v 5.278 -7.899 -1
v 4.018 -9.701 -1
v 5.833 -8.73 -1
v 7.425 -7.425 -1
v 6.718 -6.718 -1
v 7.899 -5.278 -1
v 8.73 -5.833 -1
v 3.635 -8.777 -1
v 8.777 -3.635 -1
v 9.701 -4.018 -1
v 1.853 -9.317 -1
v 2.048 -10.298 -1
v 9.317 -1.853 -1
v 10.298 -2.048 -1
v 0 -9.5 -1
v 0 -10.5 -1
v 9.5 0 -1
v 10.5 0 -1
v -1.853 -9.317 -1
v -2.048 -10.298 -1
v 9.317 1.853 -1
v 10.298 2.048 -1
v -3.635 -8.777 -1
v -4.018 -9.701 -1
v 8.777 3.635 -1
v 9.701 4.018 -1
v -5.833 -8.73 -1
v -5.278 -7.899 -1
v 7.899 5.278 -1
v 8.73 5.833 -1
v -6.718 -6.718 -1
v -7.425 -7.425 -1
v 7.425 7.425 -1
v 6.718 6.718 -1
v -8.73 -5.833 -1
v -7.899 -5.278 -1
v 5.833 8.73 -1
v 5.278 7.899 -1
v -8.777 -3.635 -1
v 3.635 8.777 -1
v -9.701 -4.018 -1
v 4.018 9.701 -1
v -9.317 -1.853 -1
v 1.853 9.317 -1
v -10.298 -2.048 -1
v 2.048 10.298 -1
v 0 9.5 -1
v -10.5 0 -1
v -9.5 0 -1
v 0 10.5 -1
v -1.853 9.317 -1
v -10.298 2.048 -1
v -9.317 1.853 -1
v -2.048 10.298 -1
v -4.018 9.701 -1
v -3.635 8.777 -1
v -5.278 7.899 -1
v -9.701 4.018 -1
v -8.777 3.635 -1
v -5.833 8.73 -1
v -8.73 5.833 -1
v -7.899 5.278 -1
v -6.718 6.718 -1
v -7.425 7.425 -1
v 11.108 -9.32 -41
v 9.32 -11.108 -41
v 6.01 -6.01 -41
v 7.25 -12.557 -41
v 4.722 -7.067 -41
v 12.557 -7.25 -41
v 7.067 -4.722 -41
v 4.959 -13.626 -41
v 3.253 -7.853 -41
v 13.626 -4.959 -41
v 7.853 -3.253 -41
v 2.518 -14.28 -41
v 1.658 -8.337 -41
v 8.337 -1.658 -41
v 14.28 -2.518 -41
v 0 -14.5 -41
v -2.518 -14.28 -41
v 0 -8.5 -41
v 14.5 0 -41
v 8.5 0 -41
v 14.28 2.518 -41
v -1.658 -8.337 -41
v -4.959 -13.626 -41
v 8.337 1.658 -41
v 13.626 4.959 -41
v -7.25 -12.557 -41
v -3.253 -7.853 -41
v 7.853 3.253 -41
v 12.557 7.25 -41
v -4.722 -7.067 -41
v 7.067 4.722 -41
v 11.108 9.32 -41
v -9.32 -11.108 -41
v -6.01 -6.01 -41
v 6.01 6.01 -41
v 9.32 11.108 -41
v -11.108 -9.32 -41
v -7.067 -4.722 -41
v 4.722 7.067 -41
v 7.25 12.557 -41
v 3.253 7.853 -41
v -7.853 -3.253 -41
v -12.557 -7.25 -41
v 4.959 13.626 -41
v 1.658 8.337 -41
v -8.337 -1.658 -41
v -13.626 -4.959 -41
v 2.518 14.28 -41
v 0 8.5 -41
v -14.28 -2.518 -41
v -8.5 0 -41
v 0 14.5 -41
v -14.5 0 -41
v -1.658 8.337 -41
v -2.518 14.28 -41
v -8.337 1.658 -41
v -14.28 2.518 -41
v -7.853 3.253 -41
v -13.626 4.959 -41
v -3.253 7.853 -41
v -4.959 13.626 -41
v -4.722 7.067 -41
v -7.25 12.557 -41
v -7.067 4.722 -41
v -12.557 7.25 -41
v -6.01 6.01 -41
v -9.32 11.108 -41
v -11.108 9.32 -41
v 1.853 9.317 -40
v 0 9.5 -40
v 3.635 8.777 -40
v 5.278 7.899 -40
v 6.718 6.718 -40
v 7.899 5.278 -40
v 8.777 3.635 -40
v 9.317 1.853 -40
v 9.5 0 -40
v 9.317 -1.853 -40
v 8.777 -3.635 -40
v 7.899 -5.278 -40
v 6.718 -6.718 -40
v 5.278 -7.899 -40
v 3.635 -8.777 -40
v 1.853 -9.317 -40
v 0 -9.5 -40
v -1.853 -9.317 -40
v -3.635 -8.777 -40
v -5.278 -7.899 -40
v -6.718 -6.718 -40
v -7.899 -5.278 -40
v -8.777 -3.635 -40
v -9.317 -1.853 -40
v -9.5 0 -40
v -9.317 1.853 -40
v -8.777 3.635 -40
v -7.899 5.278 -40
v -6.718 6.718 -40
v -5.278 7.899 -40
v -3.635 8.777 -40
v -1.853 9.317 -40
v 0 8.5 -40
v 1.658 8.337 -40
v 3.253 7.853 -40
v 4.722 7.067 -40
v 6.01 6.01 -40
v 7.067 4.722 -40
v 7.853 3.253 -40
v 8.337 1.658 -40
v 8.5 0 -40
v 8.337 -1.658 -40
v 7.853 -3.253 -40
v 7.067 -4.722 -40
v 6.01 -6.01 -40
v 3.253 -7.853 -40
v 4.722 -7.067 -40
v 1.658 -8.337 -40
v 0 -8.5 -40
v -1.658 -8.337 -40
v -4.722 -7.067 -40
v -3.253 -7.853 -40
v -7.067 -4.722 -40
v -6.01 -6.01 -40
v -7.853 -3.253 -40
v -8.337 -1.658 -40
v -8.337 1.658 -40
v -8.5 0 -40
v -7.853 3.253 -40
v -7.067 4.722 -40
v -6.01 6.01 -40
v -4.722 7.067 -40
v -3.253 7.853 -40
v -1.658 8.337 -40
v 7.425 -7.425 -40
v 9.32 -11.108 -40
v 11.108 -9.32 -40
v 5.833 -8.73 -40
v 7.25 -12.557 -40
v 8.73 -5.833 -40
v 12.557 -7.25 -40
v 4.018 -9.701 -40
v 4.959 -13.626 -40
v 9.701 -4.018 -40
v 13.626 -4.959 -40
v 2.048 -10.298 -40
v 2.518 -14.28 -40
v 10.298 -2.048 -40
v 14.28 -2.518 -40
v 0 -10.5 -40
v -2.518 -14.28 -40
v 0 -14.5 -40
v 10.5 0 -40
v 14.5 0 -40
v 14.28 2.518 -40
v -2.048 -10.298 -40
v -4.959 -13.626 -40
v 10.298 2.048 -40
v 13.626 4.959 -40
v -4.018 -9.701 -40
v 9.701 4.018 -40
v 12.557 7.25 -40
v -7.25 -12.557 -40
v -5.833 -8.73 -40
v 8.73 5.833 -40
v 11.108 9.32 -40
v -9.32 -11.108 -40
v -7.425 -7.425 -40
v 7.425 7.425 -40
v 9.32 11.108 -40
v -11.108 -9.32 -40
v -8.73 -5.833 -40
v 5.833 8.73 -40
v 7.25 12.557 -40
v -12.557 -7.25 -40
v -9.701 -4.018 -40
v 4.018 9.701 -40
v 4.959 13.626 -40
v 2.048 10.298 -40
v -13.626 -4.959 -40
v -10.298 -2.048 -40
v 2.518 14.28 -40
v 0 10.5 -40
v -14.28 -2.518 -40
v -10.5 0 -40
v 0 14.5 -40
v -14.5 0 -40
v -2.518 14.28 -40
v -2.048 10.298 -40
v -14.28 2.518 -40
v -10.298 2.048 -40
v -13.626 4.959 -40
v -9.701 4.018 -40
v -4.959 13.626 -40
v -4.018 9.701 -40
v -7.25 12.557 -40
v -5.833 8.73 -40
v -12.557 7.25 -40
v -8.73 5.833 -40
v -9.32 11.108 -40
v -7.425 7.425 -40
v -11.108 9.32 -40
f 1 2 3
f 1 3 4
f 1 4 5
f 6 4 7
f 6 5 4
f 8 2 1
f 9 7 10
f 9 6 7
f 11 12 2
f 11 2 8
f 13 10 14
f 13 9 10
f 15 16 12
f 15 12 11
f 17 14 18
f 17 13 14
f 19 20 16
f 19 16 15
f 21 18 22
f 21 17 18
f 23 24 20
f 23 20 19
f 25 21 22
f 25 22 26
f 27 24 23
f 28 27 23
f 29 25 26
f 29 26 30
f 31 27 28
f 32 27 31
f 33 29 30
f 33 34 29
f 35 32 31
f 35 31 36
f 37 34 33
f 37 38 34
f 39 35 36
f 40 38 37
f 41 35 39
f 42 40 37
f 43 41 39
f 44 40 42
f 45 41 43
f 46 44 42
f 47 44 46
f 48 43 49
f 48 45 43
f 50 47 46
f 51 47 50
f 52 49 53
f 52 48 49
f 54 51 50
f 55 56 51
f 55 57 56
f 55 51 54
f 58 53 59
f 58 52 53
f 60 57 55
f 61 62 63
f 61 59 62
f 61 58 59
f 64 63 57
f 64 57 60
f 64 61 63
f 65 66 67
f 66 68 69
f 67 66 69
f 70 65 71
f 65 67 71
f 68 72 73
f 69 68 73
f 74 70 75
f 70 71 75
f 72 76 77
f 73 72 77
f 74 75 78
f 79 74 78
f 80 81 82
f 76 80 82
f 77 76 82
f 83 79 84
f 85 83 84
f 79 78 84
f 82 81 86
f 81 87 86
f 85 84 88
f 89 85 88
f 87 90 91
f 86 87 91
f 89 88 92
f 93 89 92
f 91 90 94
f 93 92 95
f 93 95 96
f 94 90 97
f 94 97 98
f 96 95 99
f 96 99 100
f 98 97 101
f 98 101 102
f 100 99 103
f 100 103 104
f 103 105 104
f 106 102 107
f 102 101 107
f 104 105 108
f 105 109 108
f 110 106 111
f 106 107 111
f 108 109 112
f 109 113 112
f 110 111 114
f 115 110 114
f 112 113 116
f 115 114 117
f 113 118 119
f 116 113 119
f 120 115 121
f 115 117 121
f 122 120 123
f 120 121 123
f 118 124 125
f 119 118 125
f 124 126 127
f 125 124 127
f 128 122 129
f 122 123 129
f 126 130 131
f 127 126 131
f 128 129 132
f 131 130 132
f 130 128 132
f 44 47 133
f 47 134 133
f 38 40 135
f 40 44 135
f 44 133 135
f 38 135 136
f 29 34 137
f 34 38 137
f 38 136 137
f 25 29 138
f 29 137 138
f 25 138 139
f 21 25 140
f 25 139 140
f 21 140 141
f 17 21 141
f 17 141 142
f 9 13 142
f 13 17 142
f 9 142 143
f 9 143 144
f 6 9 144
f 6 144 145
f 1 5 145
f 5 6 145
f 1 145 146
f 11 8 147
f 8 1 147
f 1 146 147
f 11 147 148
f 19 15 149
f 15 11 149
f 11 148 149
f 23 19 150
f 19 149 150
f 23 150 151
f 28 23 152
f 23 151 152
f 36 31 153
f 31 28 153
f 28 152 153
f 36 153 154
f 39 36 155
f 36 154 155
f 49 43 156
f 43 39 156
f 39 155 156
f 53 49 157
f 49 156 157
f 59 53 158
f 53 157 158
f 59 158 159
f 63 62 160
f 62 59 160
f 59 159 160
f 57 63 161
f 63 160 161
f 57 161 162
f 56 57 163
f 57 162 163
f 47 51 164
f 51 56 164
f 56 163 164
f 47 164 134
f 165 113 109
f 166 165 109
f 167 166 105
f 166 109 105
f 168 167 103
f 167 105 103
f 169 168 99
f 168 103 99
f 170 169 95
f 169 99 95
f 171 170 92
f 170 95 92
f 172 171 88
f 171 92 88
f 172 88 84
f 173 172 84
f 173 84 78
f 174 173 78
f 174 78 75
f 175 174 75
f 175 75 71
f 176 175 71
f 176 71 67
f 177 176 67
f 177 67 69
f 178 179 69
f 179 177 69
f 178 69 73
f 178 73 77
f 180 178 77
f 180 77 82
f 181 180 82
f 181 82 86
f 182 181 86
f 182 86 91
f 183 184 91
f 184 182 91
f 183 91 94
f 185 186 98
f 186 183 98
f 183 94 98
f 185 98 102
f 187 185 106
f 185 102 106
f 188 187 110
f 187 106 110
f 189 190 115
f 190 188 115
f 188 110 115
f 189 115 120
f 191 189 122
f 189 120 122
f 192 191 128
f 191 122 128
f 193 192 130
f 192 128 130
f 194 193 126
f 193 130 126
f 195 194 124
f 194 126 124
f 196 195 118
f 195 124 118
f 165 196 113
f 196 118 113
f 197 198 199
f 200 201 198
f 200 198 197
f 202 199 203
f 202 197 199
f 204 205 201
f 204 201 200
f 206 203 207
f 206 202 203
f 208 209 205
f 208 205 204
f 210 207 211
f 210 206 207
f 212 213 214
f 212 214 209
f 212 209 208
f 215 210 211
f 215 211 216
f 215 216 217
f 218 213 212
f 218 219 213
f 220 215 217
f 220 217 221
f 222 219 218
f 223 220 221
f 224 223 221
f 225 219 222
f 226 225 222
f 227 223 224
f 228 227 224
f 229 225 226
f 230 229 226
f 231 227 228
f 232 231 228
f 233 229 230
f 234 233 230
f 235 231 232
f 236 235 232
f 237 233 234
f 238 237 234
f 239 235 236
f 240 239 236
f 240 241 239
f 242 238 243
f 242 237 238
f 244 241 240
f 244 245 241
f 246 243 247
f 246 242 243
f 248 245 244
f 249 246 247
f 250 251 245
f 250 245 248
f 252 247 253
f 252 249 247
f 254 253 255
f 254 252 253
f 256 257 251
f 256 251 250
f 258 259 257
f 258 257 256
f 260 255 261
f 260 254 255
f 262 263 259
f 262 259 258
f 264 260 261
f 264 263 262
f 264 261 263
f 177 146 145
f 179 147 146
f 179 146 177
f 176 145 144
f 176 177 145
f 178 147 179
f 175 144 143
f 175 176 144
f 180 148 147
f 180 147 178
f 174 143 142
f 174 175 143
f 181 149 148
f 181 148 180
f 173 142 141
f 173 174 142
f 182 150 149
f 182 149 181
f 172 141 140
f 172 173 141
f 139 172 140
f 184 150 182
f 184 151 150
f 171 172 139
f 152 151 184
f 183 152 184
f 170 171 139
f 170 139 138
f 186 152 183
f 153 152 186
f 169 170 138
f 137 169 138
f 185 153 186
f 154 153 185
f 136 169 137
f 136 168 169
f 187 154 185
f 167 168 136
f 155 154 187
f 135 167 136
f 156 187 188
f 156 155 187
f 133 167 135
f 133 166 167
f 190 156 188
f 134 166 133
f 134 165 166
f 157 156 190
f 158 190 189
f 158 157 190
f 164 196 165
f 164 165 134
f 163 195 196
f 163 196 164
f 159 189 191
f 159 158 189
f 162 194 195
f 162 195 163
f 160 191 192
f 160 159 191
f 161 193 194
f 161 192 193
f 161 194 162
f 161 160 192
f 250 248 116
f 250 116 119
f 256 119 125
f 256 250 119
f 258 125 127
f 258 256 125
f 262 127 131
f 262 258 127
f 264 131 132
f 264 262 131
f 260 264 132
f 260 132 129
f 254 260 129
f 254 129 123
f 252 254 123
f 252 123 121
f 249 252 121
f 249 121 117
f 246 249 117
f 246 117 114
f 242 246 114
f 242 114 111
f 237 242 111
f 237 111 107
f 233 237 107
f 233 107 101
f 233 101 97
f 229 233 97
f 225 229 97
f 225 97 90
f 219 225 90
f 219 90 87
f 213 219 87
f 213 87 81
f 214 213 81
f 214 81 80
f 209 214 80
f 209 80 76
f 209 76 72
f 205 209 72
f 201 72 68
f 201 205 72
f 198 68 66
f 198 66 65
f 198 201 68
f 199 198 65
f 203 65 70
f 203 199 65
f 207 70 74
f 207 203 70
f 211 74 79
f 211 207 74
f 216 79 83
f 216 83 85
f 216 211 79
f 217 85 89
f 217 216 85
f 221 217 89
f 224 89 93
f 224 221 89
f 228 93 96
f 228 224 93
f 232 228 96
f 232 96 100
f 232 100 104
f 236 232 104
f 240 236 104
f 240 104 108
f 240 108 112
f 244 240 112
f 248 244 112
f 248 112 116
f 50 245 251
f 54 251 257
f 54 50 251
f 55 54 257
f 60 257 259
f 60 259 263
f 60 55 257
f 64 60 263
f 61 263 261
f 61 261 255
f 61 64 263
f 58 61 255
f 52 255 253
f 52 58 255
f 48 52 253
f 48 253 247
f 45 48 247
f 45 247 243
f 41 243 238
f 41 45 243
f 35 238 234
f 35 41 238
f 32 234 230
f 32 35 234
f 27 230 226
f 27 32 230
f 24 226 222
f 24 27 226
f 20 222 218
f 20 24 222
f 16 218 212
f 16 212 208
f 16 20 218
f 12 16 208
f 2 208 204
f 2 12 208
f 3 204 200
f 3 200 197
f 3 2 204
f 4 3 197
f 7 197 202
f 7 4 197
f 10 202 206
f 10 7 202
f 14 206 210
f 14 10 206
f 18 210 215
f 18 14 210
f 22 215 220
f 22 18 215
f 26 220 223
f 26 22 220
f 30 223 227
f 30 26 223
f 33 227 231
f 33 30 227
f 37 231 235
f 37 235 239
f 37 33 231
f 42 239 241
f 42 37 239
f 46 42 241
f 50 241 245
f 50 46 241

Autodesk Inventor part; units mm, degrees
ref_plane "YZ Plane" through (0, 0, 0) normal (1, 0, 0) x (0, 1, 0)
ref_plane "XZ Plane" through (0, 0, 0) normal (0, 1, 0) x (-1, 0, 0)
ref_plane "XY Plane" through (0, 0, 0) normal (0, 0, 1) x (1, 0, 0)
sketch "Sketch1" plane through (0, 0, 0) normal (1, 0, 0) x (0, 1, 0)
  line L0 (10.5, -1) -> (9.5, -1)
  line L1 (9.5, -1) -> (9.5, -40)
  line L2 (9.5, -40) -> (10.5, -40)
  line L3 (10.5, -40) -> (10.5, -1)
  line L4 (14.5, -40) -> (8.5, -40)
  line L5 (8.5, -40) -> (8.5, -41)
  line L6 (8.5, -41) -> (14.5, -41)
  line L7 (14.5, -41) -> (14.5, -40)
  line L8 (0, -49.2) -> (0, 8.2) projected
  point P0 (0, 0)
  dimension "d0" = 1
  dimension "d1" = 1
  dimension "d2" = 1
  dimension "d3" = 10.5
  dimension "d4" = 4
  dimension "d5" = 40
revolve "Revolution1" add sketch "Sketch1" angle 360 about axis through (0, 0, -10) along (0, 0, 1)
thread "Thread1" size "M22x1" class "6g" standard "ISO Metric profile" full length
properties part number "bearingShellInner"
